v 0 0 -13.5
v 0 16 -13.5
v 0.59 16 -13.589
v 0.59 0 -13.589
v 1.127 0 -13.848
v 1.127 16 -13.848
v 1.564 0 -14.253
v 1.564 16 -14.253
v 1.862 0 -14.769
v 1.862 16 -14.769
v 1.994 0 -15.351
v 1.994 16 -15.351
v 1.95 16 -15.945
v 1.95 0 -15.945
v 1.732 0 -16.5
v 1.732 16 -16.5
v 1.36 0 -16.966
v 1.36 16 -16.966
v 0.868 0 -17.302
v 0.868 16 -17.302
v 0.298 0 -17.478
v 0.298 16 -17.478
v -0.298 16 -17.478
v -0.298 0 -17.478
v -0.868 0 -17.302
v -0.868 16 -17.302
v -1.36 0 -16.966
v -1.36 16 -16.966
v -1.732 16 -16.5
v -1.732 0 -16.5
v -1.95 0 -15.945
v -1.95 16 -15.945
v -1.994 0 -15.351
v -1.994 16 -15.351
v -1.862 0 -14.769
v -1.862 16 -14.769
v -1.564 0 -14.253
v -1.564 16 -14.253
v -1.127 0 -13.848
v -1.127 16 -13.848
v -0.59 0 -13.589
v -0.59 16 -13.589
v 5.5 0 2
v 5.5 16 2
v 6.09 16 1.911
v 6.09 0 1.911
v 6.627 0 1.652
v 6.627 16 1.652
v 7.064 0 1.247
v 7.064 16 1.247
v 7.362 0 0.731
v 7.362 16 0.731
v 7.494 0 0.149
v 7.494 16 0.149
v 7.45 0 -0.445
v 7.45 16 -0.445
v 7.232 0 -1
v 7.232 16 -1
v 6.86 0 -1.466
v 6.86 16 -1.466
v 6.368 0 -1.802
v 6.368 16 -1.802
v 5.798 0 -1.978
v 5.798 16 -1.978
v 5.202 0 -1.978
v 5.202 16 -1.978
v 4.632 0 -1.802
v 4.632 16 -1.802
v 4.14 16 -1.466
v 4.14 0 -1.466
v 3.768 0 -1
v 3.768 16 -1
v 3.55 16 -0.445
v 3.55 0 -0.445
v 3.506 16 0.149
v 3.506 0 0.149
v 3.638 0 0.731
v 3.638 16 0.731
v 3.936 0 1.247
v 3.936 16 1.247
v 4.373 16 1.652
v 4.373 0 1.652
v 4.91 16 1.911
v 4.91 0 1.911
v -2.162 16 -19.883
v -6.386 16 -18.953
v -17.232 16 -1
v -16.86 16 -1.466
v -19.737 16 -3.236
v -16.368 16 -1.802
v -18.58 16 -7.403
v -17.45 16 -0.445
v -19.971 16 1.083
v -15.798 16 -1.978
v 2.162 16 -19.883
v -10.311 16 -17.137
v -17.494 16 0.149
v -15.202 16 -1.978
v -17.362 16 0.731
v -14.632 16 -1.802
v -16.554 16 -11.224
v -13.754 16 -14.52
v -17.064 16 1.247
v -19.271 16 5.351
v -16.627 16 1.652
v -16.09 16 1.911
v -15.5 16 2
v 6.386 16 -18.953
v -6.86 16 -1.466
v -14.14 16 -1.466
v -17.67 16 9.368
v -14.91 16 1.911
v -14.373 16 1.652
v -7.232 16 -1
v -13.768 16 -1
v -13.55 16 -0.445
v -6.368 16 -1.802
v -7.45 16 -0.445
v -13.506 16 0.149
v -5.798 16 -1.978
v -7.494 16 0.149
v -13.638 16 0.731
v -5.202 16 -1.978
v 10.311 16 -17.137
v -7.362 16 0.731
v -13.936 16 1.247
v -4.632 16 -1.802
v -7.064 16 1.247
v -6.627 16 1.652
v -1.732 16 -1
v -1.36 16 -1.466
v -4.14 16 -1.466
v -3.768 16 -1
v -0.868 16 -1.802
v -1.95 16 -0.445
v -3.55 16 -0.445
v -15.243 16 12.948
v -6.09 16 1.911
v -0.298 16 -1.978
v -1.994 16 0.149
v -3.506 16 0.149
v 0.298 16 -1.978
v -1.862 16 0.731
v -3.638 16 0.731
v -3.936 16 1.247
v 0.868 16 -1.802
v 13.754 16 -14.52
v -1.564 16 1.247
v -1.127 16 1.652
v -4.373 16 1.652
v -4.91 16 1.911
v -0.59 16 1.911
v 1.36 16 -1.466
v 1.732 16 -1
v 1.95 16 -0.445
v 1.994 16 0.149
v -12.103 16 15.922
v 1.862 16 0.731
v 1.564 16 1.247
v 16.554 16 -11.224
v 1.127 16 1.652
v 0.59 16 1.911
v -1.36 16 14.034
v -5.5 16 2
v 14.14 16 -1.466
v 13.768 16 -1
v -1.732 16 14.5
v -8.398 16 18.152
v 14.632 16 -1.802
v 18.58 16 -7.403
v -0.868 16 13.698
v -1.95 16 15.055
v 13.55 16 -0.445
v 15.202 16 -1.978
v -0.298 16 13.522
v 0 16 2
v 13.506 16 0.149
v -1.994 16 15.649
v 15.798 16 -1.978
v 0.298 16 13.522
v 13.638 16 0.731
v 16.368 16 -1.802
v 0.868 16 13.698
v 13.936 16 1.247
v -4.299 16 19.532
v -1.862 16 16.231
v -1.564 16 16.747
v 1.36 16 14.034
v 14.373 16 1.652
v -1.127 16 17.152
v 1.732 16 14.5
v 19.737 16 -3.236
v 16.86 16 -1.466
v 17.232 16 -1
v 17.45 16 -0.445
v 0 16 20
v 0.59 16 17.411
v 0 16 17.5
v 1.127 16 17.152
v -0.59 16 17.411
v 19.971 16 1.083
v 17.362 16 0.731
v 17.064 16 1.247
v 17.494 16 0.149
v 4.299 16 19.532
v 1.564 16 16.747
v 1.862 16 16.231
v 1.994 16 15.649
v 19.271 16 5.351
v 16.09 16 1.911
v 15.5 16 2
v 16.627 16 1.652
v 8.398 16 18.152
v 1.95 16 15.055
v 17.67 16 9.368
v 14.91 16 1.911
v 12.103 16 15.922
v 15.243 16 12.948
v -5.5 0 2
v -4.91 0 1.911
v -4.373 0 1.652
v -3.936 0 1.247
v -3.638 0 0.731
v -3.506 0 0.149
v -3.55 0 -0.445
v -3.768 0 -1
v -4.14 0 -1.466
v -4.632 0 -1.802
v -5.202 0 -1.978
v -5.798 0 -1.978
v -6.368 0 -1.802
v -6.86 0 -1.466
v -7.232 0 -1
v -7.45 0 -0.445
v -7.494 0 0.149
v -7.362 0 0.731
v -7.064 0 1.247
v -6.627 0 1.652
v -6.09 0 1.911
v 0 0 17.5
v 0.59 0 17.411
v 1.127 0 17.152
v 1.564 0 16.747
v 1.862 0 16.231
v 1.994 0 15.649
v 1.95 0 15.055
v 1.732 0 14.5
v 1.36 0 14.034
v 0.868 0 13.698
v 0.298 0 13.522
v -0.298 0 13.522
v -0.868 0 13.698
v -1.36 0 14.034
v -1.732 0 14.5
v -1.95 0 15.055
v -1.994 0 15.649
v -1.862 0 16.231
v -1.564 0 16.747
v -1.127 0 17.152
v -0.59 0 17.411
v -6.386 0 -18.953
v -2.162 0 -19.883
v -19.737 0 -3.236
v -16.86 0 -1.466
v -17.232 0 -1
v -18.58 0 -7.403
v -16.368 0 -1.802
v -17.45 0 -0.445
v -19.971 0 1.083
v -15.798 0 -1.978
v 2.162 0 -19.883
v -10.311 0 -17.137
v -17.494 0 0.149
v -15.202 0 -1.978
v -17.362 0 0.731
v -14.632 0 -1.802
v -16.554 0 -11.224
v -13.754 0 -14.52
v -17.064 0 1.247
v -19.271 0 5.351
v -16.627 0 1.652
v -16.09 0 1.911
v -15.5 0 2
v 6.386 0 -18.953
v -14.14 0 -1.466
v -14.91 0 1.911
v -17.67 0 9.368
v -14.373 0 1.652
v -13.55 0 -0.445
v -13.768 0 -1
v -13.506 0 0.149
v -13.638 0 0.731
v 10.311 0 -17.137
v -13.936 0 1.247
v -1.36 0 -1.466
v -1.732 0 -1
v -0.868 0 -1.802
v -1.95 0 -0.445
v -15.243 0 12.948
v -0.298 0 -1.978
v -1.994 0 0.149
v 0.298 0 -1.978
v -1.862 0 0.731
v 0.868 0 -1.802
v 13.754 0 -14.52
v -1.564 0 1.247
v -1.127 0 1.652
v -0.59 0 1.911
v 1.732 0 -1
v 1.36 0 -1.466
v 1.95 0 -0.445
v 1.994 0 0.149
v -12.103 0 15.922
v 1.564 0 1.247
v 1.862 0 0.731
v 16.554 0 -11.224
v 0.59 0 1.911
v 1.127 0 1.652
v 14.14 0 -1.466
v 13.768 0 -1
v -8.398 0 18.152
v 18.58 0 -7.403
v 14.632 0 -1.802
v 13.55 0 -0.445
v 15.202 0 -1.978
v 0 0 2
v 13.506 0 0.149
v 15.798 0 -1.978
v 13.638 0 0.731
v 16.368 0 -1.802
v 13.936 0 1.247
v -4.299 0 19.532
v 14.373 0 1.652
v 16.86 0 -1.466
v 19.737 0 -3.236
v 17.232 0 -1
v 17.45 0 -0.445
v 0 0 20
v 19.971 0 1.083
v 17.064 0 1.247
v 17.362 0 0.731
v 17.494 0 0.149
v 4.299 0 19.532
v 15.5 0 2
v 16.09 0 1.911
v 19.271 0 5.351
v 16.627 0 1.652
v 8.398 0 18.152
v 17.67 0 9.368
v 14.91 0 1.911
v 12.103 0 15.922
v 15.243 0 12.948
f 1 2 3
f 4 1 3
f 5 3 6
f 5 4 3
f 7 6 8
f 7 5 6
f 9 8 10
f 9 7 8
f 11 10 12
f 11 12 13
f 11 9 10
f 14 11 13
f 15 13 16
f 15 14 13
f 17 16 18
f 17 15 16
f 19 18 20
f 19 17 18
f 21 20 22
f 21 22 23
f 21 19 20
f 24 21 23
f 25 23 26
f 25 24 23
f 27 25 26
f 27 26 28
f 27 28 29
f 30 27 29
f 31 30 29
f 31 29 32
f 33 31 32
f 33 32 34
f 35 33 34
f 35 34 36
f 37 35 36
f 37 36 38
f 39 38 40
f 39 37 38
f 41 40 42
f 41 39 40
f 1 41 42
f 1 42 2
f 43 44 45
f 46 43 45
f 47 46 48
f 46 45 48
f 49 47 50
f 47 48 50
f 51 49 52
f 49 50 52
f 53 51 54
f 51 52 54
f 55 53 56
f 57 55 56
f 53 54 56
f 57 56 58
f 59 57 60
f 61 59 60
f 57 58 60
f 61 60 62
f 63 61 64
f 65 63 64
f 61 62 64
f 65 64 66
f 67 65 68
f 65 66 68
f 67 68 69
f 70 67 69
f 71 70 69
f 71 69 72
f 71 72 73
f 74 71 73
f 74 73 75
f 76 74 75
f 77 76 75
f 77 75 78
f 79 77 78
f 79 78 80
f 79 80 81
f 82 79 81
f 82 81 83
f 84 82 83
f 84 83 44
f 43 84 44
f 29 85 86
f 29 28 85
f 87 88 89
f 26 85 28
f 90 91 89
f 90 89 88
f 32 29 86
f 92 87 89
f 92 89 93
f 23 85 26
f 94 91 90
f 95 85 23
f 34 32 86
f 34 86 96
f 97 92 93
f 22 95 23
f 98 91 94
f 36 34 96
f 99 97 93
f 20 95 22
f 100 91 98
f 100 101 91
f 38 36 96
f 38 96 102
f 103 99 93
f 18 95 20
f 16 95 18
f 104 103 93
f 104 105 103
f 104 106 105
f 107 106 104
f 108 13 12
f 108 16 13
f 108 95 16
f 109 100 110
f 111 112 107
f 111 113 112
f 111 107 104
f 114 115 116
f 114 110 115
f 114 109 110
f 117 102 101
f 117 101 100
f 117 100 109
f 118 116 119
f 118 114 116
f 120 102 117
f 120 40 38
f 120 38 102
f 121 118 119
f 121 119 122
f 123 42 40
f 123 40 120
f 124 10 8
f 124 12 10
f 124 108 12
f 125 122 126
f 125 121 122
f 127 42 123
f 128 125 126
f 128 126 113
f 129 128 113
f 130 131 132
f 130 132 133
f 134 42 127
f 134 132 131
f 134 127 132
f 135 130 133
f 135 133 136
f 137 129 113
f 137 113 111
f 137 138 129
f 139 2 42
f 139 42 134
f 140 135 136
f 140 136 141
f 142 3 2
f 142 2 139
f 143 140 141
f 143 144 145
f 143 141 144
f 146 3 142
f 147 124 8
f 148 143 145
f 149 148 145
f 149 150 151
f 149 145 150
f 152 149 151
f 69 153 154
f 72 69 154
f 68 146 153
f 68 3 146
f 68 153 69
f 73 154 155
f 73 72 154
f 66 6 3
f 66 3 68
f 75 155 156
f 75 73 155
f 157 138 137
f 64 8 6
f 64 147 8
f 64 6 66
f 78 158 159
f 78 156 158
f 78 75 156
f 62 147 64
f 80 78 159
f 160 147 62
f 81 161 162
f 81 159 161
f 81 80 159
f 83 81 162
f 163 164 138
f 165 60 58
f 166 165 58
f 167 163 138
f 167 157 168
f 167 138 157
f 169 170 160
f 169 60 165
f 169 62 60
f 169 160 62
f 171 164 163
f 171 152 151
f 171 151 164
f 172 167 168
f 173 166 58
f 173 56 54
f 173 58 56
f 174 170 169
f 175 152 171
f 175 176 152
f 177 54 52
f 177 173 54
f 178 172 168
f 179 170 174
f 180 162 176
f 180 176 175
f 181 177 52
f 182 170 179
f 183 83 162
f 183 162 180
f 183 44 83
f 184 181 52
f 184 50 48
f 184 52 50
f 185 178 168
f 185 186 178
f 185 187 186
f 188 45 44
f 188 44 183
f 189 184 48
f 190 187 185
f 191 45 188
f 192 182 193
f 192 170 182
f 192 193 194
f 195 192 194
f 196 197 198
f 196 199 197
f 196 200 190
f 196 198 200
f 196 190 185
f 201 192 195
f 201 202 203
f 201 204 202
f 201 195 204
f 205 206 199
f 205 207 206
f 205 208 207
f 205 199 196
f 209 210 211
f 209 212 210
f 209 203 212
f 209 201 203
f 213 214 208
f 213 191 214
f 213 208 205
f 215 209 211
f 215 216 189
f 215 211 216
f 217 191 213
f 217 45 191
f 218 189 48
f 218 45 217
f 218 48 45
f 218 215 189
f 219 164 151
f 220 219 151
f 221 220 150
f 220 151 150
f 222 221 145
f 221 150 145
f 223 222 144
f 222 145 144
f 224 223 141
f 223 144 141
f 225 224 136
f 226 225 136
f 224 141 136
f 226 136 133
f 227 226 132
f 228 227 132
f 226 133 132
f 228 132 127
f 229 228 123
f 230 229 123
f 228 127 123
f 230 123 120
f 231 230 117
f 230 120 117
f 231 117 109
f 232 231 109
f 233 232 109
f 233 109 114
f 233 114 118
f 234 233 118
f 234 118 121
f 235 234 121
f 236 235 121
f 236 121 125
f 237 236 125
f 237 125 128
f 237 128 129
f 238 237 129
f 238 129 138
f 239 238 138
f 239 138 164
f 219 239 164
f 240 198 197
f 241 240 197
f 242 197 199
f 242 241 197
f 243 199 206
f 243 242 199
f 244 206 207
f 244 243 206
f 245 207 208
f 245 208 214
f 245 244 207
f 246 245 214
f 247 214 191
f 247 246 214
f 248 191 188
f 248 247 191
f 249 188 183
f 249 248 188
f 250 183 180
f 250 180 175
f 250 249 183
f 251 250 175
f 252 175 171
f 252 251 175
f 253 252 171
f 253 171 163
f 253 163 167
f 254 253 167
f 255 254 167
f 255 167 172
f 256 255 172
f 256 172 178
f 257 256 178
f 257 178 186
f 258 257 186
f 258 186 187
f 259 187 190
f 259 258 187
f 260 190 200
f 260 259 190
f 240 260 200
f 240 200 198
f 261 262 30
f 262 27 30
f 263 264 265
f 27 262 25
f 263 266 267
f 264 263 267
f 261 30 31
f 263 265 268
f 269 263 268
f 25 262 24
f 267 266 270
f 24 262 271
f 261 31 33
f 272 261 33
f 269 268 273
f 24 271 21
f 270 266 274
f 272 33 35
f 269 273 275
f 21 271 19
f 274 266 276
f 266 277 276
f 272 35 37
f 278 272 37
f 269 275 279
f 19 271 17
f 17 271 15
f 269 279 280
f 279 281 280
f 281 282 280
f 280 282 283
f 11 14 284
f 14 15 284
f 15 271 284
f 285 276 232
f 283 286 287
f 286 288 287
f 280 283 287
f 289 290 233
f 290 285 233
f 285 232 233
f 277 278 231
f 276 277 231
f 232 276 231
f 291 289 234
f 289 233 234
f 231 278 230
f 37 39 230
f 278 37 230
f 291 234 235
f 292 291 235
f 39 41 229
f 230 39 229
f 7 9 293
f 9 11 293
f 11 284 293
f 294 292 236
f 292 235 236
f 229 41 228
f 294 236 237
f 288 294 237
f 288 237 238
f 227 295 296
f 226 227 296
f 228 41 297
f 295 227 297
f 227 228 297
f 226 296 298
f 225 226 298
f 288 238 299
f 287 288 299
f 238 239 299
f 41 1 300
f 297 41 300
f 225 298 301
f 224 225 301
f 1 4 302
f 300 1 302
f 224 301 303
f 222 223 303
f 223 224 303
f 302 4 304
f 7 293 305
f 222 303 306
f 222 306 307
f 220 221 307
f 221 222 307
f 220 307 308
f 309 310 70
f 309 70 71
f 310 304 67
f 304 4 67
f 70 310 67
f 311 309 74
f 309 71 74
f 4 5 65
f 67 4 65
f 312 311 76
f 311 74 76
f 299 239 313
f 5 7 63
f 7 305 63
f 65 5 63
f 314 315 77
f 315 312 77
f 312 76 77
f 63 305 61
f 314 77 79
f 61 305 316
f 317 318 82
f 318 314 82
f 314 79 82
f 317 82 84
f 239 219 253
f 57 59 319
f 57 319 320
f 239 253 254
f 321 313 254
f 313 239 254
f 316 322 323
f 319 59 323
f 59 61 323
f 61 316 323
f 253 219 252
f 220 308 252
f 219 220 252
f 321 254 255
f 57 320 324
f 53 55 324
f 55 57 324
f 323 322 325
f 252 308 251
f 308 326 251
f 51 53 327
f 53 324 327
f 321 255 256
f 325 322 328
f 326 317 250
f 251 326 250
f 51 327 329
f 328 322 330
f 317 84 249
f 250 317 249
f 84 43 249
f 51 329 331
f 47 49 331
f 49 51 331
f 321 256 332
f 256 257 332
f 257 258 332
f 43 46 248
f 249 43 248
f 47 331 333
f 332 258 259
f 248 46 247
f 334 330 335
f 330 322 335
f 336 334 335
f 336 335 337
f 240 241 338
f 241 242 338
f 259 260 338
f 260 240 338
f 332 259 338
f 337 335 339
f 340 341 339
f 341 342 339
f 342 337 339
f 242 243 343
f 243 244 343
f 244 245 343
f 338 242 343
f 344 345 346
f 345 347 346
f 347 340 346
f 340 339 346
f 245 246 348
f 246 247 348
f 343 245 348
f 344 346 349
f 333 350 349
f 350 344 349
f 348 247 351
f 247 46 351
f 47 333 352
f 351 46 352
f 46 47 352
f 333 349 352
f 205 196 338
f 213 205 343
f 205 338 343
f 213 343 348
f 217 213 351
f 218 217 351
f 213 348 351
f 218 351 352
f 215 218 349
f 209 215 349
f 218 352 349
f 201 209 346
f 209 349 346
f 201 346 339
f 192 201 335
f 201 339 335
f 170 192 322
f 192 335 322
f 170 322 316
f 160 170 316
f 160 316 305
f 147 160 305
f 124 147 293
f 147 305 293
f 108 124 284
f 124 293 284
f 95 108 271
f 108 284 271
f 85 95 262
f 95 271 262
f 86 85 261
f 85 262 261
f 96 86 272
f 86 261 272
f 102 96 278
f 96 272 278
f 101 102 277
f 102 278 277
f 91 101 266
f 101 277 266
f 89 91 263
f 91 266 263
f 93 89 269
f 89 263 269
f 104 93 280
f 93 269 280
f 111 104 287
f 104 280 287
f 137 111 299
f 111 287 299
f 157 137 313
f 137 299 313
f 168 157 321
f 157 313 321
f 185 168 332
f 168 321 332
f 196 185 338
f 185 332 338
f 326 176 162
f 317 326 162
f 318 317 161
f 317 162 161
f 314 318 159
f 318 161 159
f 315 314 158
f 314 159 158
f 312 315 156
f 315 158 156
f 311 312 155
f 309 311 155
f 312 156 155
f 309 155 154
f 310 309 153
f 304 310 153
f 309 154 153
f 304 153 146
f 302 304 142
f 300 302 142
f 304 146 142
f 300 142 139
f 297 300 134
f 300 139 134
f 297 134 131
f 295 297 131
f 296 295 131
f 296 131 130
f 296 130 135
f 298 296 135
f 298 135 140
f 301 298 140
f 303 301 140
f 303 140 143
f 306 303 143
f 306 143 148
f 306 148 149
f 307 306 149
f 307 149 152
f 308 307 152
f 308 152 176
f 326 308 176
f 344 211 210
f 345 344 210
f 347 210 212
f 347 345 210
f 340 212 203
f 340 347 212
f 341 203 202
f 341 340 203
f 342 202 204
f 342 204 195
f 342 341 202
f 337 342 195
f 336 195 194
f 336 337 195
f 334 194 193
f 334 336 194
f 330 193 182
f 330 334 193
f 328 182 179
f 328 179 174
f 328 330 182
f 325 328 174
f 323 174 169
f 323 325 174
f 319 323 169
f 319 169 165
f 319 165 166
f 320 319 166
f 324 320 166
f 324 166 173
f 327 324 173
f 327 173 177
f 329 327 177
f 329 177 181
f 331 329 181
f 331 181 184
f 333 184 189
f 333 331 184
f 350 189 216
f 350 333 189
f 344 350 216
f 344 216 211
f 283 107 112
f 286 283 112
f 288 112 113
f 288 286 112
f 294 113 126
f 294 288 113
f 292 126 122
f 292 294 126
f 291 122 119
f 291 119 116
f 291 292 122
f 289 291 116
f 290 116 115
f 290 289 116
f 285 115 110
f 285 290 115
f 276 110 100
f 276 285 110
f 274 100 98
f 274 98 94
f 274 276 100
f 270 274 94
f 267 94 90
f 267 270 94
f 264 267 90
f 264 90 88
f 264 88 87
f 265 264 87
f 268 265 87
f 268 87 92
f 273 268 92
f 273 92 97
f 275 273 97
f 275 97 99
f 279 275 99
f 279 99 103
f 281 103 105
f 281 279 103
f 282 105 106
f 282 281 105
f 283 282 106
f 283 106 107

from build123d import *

# Parameters (mm, degrees)
SKETCH1_R           = 20
SKETCH1_R_2         = 2
BOSS_EXTRUDE1_DEPTH = 16
SKETCH2_R           = 2
CUT_EXTRUDE1_DEPTH  = 33.496153619


with BuildPart() as part:
    # Sketch1 → Boss-Extrude1 (new body)
    with BuildSketch(Plane(origin=(0, 0, 0), x_dir=(1, 0, 0), z_dir=(0, 1, 0))):
        with Locations(Location((0, 0, 0), (0, 0, 270))):
            Circle(SKETCH1_R)
        with Locations(Location((0, 15.5, 0), (0, 0, 270))):
            Circle(SKETCH1_R_2, mode=Mode.SUBTRACT)
        with Locations(Location((15.5, 0, 0), (0, 0, 270))):
            Circle(SKETCH1_R_2, mode=Mode.SUBTRACT)
        with Locations(Location((0, -15.5, 0), (0, 0, 270))):
            Circle(SKETCH1_R_2, mode=Mode.SUBTRACT)
        with Locations(Location((-15.5, 0, 0), (0, 0, 270))):
            Circle(SKETCH1_R_2, mode=Mode.SUBTRACT)
    extrude(amount=BOSS_EXTRUDE1_DEPTH)

    # Sketch2 → Cut-Extrude1 (cut, through all)
    with BuildSketch(Plane(origin=(0, 16, 0), x_dir=(1, 0, 0), z_dir=(0, 1, 0))):
        with Locations(Location((0, 0, 0), (0, 0, 270))):
            Circle(SKETCH2_R)
        with Locations(Location((5.5, 0, 0), (0, 0, 270))):
            Circle(SKETCH2_R)
        with Locations(Location((-5.5, 0, 0), (0, 0, 270))):
            Circle(SKETCH2_R)
    extrude(amount=-CUT_EXTRUDE1_DEPTH, mode=Mode.SUBTRACT)


solid = part.part
